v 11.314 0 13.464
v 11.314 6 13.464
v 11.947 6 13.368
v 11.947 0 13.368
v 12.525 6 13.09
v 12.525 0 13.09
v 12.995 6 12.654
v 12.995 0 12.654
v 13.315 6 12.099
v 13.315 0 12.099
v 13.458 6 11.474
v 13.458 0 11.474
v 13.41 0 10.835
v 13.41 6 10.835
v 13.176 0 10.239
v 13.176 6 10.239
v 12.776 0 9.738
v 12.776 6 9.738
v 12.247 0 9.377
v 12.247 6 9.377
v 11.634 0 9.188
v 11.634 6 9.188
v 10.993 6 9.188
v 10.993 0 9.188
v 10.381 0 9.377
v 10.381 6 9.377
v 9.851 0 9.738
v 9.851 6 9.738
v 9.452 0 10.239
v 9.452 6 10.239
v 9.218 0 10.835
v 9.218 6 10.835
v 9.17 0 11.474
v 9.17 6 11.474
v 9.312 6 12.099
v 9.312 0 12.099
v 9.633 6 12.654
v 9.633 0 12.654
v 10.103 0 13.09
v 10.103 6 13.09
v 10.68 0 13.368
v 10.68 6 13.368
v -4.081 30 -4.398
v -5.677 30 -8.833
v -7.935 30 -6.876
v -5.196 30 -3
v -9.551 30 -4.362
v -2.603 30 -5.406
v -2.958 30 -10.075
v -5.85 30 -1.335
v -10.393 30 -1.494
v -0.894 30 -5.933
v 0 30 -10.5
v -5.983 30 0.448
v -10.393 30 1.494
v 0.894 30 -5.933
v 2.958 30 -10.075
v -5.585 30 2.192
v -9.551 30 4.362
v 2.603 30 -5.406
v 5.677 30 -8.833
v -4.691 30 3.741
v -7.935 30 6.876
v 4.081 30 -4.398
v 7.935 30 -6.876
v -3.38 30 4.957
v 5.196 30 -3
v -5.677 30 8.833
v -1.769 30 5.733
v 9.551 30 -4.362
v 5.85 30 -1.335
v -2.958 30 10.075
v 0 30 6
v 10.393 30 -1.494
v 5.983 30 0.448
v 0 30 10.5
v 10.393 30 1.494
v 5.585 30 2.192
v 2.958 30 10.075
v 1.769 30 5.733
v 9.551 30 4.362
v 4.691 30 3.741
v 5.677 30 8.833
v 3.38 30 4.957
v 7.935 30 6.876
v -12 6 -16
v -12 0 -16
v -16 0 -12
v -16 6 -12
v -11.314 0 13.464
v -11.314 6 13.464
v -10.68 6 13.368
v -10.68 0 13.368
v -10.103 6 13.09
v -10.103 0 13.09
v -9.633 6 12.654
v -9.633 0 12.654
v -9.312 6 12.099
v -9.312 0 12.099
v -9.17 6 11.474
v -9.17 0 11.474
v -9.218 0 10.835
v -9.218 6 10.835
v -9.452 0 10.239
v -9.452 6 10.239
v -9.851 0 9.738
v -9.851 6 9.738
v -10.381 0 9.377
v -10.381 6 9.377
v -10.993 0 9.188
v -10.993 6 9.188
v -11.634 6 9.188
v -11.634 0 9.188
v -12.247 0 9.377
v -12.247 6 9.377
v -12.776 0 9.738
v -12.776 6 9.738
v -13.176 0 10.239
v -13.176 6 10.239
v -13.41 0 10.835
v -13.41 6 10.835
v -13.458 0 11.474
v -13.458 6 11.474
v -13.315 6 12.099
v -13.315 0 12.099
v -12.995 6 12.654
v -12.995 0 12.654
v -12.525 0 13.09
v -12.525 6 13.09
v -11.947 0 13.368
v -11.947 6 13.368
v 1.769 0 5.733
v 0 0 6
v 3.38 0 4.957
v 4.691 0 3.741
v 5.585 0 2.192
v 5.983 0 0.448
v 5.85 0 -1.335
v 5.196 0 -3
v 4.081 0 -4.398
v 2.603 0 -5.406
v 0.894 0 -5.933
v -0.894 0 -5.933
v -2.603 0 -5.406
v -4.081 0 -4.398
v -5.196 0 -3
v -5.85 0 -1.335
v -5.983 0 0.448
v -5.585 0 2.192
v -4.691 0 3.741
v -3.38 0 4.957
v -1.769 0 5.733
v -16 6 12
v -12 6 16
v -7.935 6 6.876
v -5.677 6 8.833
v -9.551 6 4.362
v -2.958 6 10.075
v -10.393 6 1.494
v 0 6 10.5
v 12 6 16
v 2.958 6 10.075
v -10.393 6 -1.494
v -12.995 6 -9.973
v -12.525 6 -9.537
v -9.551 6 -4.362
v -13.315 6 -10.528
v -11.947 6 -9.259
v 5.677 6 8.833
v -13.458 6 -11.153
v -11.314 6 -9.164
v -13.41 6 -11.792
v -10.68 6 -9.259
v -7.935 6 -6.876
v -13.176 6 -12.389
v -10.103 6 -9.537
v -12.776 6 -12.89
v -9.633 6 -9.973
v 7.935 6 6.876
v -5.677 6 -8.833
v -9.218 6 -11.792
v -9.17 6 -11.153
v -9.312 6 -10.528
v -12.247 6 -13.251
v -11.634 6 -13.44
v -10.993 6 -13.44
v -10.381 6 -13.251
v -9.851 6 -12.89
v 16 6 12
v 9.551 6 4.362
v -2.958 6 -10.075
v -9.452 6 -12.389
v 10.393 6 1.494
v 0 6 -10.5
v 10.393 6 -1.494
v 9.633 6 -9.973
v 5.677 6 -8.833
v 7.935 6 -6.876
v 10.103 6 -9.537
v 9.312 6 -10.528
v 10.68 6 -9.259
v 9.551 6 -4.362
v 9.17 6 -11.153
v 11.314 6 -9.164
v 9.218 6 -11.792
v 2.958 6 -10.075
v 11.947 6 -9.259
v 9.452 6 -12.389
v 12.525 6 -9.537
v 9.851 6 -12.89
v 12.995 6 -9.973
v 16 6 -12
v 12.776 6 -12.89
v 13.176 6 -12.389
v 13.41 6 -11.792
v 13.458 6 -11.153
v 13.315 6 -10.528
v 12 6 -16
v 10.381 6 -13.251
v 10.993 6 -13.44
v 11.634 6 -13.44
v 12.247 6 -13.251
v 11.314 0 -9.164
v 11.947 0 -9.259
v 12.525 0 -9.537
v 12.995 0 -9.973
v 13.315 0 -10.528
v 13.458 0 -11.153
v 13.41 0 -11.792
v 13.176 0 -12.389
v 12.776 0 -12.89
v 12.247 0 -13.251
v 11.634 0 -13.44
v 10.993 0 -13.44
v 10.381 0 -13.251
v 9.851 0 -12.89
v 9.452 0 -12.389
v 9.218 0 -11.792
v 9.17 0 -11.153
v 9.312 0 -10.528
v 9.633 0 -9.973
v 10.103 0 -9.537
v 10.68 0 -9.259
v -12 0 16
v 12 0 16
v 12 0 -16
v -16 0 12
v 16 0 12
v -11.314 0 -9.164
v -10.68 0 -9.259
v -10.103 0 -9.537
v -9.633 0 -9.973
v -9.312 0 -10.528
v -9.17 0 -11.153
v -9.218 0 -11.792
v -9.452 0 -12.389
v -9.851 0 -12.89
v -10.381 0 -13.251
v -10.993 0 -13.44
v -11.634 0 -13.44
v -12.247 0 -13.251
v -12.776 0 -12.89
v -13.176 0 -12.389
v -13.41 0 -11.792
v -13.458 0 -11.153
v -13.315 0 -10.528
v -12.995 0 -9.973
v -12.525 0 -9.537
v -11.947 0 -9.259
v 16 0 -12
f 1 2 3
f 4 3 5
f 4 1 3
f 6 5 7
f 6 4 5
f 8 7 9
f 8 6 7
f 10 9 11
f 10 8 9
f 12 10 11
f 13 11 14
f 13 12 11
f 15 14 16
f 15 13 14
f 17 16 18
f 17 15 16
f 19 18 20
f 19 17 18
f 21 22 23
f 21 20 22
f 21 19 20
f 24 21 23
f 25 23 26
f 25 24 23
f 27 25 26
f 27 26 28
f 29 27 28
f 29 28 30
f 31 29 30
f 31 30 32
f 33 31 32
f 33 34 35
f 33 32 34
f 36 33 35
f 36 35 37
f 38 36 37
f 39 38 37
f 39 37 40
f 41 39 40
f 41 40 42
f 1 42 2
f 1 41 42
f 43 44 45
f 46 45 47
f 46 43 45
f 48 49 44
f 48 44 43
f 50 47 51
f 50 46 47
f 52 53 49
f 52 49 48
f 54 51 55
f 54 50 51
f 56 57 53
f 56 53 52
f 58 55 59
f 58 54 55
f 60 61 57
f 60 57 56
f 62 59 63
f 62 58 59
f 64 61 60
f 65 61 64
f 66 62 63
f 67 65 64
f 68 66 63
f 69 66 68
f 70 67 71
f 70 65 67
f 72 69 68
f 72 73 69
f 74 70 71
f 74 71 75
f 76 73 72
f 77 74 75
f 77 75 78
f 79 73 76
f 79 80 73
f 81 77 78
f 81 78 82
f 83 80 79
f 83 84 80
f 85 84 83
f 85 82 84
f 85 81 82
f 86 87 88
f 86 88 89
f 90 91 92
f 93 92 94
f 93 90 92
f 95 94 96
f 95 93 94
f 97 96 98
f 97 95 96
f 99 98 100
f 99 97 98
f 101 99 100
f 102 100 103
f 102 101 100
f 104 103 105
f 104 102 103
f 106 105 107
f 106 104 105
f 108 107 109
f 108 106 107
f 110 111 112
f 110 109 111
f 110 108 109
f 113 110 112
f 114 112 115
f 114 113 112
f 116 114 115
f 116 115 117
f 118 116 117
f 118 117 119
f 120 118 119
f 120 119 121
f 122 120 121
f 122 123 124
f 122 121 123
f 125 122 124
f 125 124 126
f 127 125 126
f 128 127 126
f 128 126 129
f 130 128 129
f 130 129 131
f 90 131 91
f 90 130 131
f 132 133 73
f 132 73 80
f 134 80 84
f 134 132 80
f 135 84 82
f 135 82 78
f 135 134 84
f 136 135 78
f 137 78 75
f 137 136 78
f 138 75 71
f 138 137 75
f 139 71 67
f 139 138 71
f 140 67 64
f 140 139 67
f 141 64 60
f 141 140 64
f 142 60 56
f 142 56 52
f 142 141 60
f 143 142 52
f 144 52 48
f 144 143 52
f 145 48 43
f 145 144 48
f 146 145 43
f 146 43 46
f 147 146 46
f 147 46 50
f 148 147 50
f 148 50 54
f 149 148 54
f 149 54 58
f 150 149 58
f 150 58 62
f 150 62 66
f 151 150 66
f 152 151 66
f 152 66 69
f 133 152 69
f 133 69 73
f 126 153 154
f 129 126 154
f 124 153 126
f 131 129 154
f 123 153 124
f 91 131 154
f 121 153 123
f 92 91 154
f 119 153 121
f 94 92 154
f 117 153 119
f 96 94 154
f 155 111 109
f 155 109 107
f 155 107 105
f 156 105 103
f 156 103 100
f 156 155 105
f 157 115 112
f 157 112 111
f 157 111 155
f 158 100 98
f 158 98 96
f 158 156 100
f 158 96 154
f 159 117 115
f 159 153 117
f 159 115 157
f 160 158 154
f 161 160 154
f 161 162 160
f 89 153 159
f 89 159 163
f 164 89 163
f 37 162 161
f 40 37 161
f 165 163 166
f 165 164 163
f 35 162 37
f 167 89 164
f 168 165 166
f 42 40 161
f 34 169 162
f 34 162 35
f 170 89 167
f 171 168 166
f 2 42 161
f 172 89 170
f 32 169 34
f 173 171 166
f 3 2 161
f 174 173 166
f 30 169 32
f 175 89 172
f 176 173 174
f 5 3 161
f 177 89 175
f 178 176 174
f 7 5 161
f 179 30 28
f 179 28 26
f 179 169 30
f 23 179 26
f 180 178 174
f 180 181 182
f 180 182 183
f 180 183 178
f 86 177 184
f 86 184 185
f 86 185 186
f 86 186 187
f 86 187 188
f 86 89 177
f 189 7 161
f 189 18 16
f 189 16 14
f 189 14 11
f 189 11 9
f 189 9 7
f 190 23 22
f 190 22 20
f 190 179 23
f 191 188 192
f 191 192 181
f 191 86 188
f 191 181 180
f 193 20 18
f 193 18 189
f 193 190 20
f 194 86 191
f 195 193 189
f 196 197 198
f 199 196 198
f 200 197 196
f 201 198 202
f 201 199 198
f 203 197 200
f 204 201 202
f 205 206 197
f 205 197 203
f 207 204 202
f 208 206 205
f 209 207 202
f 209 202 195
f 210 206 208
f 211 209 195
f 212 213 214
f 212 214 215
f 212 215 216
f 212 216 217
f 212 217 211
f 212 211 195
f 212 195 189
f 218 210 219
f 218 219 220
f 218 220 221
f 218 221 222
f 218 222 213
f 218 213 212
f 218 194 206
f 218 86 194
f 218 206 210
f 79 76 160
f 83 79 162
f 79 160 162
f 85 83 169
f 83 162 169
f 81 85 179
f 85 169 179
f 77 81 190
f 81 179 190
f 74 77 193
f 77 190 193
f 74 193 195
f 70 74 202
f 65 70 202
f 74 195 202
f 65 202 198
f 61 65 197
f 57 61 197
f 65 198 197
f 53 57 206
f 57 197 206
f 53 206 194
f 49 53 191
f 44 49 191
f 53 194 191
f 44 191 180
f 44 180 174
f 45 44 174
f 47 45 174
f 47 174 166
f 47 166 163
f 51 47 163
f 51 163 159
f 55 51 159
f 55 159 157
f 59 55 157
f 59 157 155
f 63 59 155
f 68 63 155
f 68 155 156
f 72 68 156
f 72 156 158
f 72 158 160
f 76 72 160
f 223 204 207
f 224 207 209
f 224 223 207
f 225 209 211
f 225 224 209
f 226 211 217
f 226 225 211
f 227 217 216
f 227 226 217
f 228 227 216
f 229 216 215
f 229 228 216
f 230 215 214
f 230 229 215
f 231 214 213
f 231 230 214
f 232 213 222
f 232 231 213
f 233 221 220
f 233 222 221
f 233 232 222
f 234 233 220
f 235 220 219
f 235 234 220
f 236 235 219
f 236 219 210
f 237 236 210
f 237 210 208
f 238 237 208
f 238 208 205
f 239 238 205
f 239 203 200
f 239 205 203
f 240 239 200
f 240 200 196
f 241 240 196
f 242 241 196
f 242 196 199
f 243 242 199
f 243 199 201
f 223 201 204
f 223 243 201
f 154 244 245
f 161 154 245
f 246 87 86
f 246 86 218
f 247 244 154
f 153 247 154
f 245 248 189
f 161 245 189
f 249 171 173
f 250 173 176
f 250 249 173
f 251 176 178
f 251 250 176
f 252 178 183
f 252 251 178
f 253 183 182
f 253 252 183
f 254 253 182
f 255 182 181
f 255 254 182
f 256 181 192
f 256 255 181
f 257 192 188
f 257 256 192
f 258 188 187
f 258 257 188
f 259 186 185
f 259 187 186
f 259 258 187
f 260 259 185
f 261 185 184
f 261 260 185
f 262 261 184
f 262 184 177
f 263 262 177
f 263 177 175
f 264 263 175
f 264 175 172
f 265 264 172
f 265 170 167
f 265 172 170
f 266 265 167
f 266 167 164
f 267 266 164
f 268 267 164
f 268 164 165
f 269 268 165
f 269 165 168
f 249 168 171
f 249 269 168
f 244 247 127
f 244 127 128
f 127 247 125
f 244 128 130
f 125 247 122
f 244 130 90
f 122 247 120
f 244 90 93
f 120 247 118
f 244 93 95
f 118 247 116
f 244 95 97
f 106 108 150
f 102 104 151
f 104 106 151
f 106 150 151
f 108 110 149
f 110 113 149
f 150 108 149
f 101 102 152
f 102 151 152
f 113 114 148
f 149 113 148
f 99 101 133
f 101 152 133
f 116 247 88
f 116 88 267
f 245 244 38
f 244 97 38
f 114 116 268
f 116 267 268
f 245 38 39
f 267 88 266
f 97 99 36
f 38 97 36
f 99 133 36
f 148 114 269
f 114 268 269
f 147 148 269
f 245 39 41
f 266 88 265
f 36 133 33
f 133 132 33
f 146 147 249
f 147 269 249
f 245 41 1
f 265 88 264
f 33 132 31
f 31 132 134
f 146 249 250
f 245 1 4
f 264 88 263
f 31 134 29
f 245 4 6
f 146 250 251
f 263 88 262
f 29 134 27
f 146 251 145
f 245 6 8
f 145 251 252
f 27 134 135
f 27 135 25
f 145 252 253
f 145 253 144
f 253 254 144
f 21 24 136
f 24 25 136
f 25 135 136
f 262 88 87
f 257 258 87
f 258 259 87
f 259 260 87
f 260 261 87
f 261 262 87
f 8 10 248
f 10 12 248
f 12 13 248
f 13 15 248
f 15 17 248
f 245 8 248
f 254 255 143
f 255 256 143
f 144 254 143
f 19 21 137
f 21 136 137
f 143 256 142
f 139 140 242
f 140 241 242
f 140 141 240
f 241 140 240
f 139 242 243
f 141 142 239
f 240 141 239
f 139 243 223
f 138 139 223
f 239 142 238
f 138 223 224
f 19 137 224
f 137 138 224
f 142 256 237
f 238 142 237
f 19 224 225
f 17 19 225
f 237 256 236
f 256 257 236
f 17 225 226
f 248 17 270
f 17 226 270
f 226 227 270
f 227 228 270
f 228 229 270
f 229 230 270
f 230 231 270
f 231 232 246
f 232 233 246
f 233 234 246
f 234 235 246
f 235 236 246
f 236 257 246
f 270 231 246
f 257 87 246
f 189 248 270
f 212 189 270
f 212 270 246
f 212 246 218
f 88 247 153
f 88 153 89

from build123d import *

# Parameters (mm, degrees)
SKETCH1_R           = 10.5
SKETCH1_R_2         = 6
BOSS_EXTRUDE1_DEPTH = 30
SKETCH2_W           = 32
SKETCH2_H           = 32
SKETCH2_R           = 6
BOSS_EXTRUDE2_DEPTH = 6
SKETCH3_R           = 2.15
CUT_EXTRUDE1_DEPTH  = 38.576588456
CHAMFER1_SIZE       = 4


with BuildPart() as part:
    # Sketch1 → Boss-Extrude1 (new body)
    with BuildSketch(Plane(origin=(0, 0, 0), x_dir=(1, 0, 0), z_dir=(0, 1, 0))):
        with Locations(Location((0, 0, 0), (0, 0, 270))):
            Circle(SKETCH1_R)
        with Locations(Location((0, 0, 0), (0, 0, 270))):
            Circle(SKETCH1_R_2, mode=Mode.SUBTRACT)
    extrude(amount=BOSS_EXTRUDE1_DEPTH)

    # Sketch2 → Boss-Extrude2 (add)
    with BuildSketch(Plane(origin=(0, 0, 0), x_dir=(1, 0, 0), z_dir=(0, 1, 0))):
        Rectangle(SKETCH2_W, SKETCH2_H)
        with Locations(Location((0, 0, 0), (0, 0, 270))):
            Circle(SKETCH2_R, mode=Mode.SUBTRACT)
    extrude(amount=BOSS_EXTRUDE2_DEPTH)

    # Sketch3 → Cut-Extrude1 (cut, through all)
    with BuildSketch(Plane(origin=(0, 0, 0), x_dir=(1, 0, 0), z_dir=(0, 1, 0))):
        with Locations(Location((-11.313708499, 11.313708499, 0), (0, 0, 270))):
            Circle(SKETCH3_R)
        with Locations(Location((-11.313708499, -11.313708499, 0), (0, 0, 270))):
            Circle(SKETCH3_R)
        with Locations(Location((11.313708499, -11.313708499, 0), (0, 0, 270))):
            Circle(SKETCH3_R)
        with Locations(Location((11.313708499, 11.313708499, 0), (0, 0, 270))):
            Circle(SKETCH3_R)
    extrude(amount=CUT_EXTRUDE1_DEPTH, mode=Mode.SUBTRACT)

    # Chamfer1
    chamfer1_edges = [part.edges().sort_by_distance(p)[0] for p in [
        (16, 3, 16),
        (16, 3, -16),
        (-16, 3, -16),
        (-16, 3, 16),
    ]]
    chamfer(chamfer1_edges, length=CHAMFER1_SIZE)


solid = part.part
